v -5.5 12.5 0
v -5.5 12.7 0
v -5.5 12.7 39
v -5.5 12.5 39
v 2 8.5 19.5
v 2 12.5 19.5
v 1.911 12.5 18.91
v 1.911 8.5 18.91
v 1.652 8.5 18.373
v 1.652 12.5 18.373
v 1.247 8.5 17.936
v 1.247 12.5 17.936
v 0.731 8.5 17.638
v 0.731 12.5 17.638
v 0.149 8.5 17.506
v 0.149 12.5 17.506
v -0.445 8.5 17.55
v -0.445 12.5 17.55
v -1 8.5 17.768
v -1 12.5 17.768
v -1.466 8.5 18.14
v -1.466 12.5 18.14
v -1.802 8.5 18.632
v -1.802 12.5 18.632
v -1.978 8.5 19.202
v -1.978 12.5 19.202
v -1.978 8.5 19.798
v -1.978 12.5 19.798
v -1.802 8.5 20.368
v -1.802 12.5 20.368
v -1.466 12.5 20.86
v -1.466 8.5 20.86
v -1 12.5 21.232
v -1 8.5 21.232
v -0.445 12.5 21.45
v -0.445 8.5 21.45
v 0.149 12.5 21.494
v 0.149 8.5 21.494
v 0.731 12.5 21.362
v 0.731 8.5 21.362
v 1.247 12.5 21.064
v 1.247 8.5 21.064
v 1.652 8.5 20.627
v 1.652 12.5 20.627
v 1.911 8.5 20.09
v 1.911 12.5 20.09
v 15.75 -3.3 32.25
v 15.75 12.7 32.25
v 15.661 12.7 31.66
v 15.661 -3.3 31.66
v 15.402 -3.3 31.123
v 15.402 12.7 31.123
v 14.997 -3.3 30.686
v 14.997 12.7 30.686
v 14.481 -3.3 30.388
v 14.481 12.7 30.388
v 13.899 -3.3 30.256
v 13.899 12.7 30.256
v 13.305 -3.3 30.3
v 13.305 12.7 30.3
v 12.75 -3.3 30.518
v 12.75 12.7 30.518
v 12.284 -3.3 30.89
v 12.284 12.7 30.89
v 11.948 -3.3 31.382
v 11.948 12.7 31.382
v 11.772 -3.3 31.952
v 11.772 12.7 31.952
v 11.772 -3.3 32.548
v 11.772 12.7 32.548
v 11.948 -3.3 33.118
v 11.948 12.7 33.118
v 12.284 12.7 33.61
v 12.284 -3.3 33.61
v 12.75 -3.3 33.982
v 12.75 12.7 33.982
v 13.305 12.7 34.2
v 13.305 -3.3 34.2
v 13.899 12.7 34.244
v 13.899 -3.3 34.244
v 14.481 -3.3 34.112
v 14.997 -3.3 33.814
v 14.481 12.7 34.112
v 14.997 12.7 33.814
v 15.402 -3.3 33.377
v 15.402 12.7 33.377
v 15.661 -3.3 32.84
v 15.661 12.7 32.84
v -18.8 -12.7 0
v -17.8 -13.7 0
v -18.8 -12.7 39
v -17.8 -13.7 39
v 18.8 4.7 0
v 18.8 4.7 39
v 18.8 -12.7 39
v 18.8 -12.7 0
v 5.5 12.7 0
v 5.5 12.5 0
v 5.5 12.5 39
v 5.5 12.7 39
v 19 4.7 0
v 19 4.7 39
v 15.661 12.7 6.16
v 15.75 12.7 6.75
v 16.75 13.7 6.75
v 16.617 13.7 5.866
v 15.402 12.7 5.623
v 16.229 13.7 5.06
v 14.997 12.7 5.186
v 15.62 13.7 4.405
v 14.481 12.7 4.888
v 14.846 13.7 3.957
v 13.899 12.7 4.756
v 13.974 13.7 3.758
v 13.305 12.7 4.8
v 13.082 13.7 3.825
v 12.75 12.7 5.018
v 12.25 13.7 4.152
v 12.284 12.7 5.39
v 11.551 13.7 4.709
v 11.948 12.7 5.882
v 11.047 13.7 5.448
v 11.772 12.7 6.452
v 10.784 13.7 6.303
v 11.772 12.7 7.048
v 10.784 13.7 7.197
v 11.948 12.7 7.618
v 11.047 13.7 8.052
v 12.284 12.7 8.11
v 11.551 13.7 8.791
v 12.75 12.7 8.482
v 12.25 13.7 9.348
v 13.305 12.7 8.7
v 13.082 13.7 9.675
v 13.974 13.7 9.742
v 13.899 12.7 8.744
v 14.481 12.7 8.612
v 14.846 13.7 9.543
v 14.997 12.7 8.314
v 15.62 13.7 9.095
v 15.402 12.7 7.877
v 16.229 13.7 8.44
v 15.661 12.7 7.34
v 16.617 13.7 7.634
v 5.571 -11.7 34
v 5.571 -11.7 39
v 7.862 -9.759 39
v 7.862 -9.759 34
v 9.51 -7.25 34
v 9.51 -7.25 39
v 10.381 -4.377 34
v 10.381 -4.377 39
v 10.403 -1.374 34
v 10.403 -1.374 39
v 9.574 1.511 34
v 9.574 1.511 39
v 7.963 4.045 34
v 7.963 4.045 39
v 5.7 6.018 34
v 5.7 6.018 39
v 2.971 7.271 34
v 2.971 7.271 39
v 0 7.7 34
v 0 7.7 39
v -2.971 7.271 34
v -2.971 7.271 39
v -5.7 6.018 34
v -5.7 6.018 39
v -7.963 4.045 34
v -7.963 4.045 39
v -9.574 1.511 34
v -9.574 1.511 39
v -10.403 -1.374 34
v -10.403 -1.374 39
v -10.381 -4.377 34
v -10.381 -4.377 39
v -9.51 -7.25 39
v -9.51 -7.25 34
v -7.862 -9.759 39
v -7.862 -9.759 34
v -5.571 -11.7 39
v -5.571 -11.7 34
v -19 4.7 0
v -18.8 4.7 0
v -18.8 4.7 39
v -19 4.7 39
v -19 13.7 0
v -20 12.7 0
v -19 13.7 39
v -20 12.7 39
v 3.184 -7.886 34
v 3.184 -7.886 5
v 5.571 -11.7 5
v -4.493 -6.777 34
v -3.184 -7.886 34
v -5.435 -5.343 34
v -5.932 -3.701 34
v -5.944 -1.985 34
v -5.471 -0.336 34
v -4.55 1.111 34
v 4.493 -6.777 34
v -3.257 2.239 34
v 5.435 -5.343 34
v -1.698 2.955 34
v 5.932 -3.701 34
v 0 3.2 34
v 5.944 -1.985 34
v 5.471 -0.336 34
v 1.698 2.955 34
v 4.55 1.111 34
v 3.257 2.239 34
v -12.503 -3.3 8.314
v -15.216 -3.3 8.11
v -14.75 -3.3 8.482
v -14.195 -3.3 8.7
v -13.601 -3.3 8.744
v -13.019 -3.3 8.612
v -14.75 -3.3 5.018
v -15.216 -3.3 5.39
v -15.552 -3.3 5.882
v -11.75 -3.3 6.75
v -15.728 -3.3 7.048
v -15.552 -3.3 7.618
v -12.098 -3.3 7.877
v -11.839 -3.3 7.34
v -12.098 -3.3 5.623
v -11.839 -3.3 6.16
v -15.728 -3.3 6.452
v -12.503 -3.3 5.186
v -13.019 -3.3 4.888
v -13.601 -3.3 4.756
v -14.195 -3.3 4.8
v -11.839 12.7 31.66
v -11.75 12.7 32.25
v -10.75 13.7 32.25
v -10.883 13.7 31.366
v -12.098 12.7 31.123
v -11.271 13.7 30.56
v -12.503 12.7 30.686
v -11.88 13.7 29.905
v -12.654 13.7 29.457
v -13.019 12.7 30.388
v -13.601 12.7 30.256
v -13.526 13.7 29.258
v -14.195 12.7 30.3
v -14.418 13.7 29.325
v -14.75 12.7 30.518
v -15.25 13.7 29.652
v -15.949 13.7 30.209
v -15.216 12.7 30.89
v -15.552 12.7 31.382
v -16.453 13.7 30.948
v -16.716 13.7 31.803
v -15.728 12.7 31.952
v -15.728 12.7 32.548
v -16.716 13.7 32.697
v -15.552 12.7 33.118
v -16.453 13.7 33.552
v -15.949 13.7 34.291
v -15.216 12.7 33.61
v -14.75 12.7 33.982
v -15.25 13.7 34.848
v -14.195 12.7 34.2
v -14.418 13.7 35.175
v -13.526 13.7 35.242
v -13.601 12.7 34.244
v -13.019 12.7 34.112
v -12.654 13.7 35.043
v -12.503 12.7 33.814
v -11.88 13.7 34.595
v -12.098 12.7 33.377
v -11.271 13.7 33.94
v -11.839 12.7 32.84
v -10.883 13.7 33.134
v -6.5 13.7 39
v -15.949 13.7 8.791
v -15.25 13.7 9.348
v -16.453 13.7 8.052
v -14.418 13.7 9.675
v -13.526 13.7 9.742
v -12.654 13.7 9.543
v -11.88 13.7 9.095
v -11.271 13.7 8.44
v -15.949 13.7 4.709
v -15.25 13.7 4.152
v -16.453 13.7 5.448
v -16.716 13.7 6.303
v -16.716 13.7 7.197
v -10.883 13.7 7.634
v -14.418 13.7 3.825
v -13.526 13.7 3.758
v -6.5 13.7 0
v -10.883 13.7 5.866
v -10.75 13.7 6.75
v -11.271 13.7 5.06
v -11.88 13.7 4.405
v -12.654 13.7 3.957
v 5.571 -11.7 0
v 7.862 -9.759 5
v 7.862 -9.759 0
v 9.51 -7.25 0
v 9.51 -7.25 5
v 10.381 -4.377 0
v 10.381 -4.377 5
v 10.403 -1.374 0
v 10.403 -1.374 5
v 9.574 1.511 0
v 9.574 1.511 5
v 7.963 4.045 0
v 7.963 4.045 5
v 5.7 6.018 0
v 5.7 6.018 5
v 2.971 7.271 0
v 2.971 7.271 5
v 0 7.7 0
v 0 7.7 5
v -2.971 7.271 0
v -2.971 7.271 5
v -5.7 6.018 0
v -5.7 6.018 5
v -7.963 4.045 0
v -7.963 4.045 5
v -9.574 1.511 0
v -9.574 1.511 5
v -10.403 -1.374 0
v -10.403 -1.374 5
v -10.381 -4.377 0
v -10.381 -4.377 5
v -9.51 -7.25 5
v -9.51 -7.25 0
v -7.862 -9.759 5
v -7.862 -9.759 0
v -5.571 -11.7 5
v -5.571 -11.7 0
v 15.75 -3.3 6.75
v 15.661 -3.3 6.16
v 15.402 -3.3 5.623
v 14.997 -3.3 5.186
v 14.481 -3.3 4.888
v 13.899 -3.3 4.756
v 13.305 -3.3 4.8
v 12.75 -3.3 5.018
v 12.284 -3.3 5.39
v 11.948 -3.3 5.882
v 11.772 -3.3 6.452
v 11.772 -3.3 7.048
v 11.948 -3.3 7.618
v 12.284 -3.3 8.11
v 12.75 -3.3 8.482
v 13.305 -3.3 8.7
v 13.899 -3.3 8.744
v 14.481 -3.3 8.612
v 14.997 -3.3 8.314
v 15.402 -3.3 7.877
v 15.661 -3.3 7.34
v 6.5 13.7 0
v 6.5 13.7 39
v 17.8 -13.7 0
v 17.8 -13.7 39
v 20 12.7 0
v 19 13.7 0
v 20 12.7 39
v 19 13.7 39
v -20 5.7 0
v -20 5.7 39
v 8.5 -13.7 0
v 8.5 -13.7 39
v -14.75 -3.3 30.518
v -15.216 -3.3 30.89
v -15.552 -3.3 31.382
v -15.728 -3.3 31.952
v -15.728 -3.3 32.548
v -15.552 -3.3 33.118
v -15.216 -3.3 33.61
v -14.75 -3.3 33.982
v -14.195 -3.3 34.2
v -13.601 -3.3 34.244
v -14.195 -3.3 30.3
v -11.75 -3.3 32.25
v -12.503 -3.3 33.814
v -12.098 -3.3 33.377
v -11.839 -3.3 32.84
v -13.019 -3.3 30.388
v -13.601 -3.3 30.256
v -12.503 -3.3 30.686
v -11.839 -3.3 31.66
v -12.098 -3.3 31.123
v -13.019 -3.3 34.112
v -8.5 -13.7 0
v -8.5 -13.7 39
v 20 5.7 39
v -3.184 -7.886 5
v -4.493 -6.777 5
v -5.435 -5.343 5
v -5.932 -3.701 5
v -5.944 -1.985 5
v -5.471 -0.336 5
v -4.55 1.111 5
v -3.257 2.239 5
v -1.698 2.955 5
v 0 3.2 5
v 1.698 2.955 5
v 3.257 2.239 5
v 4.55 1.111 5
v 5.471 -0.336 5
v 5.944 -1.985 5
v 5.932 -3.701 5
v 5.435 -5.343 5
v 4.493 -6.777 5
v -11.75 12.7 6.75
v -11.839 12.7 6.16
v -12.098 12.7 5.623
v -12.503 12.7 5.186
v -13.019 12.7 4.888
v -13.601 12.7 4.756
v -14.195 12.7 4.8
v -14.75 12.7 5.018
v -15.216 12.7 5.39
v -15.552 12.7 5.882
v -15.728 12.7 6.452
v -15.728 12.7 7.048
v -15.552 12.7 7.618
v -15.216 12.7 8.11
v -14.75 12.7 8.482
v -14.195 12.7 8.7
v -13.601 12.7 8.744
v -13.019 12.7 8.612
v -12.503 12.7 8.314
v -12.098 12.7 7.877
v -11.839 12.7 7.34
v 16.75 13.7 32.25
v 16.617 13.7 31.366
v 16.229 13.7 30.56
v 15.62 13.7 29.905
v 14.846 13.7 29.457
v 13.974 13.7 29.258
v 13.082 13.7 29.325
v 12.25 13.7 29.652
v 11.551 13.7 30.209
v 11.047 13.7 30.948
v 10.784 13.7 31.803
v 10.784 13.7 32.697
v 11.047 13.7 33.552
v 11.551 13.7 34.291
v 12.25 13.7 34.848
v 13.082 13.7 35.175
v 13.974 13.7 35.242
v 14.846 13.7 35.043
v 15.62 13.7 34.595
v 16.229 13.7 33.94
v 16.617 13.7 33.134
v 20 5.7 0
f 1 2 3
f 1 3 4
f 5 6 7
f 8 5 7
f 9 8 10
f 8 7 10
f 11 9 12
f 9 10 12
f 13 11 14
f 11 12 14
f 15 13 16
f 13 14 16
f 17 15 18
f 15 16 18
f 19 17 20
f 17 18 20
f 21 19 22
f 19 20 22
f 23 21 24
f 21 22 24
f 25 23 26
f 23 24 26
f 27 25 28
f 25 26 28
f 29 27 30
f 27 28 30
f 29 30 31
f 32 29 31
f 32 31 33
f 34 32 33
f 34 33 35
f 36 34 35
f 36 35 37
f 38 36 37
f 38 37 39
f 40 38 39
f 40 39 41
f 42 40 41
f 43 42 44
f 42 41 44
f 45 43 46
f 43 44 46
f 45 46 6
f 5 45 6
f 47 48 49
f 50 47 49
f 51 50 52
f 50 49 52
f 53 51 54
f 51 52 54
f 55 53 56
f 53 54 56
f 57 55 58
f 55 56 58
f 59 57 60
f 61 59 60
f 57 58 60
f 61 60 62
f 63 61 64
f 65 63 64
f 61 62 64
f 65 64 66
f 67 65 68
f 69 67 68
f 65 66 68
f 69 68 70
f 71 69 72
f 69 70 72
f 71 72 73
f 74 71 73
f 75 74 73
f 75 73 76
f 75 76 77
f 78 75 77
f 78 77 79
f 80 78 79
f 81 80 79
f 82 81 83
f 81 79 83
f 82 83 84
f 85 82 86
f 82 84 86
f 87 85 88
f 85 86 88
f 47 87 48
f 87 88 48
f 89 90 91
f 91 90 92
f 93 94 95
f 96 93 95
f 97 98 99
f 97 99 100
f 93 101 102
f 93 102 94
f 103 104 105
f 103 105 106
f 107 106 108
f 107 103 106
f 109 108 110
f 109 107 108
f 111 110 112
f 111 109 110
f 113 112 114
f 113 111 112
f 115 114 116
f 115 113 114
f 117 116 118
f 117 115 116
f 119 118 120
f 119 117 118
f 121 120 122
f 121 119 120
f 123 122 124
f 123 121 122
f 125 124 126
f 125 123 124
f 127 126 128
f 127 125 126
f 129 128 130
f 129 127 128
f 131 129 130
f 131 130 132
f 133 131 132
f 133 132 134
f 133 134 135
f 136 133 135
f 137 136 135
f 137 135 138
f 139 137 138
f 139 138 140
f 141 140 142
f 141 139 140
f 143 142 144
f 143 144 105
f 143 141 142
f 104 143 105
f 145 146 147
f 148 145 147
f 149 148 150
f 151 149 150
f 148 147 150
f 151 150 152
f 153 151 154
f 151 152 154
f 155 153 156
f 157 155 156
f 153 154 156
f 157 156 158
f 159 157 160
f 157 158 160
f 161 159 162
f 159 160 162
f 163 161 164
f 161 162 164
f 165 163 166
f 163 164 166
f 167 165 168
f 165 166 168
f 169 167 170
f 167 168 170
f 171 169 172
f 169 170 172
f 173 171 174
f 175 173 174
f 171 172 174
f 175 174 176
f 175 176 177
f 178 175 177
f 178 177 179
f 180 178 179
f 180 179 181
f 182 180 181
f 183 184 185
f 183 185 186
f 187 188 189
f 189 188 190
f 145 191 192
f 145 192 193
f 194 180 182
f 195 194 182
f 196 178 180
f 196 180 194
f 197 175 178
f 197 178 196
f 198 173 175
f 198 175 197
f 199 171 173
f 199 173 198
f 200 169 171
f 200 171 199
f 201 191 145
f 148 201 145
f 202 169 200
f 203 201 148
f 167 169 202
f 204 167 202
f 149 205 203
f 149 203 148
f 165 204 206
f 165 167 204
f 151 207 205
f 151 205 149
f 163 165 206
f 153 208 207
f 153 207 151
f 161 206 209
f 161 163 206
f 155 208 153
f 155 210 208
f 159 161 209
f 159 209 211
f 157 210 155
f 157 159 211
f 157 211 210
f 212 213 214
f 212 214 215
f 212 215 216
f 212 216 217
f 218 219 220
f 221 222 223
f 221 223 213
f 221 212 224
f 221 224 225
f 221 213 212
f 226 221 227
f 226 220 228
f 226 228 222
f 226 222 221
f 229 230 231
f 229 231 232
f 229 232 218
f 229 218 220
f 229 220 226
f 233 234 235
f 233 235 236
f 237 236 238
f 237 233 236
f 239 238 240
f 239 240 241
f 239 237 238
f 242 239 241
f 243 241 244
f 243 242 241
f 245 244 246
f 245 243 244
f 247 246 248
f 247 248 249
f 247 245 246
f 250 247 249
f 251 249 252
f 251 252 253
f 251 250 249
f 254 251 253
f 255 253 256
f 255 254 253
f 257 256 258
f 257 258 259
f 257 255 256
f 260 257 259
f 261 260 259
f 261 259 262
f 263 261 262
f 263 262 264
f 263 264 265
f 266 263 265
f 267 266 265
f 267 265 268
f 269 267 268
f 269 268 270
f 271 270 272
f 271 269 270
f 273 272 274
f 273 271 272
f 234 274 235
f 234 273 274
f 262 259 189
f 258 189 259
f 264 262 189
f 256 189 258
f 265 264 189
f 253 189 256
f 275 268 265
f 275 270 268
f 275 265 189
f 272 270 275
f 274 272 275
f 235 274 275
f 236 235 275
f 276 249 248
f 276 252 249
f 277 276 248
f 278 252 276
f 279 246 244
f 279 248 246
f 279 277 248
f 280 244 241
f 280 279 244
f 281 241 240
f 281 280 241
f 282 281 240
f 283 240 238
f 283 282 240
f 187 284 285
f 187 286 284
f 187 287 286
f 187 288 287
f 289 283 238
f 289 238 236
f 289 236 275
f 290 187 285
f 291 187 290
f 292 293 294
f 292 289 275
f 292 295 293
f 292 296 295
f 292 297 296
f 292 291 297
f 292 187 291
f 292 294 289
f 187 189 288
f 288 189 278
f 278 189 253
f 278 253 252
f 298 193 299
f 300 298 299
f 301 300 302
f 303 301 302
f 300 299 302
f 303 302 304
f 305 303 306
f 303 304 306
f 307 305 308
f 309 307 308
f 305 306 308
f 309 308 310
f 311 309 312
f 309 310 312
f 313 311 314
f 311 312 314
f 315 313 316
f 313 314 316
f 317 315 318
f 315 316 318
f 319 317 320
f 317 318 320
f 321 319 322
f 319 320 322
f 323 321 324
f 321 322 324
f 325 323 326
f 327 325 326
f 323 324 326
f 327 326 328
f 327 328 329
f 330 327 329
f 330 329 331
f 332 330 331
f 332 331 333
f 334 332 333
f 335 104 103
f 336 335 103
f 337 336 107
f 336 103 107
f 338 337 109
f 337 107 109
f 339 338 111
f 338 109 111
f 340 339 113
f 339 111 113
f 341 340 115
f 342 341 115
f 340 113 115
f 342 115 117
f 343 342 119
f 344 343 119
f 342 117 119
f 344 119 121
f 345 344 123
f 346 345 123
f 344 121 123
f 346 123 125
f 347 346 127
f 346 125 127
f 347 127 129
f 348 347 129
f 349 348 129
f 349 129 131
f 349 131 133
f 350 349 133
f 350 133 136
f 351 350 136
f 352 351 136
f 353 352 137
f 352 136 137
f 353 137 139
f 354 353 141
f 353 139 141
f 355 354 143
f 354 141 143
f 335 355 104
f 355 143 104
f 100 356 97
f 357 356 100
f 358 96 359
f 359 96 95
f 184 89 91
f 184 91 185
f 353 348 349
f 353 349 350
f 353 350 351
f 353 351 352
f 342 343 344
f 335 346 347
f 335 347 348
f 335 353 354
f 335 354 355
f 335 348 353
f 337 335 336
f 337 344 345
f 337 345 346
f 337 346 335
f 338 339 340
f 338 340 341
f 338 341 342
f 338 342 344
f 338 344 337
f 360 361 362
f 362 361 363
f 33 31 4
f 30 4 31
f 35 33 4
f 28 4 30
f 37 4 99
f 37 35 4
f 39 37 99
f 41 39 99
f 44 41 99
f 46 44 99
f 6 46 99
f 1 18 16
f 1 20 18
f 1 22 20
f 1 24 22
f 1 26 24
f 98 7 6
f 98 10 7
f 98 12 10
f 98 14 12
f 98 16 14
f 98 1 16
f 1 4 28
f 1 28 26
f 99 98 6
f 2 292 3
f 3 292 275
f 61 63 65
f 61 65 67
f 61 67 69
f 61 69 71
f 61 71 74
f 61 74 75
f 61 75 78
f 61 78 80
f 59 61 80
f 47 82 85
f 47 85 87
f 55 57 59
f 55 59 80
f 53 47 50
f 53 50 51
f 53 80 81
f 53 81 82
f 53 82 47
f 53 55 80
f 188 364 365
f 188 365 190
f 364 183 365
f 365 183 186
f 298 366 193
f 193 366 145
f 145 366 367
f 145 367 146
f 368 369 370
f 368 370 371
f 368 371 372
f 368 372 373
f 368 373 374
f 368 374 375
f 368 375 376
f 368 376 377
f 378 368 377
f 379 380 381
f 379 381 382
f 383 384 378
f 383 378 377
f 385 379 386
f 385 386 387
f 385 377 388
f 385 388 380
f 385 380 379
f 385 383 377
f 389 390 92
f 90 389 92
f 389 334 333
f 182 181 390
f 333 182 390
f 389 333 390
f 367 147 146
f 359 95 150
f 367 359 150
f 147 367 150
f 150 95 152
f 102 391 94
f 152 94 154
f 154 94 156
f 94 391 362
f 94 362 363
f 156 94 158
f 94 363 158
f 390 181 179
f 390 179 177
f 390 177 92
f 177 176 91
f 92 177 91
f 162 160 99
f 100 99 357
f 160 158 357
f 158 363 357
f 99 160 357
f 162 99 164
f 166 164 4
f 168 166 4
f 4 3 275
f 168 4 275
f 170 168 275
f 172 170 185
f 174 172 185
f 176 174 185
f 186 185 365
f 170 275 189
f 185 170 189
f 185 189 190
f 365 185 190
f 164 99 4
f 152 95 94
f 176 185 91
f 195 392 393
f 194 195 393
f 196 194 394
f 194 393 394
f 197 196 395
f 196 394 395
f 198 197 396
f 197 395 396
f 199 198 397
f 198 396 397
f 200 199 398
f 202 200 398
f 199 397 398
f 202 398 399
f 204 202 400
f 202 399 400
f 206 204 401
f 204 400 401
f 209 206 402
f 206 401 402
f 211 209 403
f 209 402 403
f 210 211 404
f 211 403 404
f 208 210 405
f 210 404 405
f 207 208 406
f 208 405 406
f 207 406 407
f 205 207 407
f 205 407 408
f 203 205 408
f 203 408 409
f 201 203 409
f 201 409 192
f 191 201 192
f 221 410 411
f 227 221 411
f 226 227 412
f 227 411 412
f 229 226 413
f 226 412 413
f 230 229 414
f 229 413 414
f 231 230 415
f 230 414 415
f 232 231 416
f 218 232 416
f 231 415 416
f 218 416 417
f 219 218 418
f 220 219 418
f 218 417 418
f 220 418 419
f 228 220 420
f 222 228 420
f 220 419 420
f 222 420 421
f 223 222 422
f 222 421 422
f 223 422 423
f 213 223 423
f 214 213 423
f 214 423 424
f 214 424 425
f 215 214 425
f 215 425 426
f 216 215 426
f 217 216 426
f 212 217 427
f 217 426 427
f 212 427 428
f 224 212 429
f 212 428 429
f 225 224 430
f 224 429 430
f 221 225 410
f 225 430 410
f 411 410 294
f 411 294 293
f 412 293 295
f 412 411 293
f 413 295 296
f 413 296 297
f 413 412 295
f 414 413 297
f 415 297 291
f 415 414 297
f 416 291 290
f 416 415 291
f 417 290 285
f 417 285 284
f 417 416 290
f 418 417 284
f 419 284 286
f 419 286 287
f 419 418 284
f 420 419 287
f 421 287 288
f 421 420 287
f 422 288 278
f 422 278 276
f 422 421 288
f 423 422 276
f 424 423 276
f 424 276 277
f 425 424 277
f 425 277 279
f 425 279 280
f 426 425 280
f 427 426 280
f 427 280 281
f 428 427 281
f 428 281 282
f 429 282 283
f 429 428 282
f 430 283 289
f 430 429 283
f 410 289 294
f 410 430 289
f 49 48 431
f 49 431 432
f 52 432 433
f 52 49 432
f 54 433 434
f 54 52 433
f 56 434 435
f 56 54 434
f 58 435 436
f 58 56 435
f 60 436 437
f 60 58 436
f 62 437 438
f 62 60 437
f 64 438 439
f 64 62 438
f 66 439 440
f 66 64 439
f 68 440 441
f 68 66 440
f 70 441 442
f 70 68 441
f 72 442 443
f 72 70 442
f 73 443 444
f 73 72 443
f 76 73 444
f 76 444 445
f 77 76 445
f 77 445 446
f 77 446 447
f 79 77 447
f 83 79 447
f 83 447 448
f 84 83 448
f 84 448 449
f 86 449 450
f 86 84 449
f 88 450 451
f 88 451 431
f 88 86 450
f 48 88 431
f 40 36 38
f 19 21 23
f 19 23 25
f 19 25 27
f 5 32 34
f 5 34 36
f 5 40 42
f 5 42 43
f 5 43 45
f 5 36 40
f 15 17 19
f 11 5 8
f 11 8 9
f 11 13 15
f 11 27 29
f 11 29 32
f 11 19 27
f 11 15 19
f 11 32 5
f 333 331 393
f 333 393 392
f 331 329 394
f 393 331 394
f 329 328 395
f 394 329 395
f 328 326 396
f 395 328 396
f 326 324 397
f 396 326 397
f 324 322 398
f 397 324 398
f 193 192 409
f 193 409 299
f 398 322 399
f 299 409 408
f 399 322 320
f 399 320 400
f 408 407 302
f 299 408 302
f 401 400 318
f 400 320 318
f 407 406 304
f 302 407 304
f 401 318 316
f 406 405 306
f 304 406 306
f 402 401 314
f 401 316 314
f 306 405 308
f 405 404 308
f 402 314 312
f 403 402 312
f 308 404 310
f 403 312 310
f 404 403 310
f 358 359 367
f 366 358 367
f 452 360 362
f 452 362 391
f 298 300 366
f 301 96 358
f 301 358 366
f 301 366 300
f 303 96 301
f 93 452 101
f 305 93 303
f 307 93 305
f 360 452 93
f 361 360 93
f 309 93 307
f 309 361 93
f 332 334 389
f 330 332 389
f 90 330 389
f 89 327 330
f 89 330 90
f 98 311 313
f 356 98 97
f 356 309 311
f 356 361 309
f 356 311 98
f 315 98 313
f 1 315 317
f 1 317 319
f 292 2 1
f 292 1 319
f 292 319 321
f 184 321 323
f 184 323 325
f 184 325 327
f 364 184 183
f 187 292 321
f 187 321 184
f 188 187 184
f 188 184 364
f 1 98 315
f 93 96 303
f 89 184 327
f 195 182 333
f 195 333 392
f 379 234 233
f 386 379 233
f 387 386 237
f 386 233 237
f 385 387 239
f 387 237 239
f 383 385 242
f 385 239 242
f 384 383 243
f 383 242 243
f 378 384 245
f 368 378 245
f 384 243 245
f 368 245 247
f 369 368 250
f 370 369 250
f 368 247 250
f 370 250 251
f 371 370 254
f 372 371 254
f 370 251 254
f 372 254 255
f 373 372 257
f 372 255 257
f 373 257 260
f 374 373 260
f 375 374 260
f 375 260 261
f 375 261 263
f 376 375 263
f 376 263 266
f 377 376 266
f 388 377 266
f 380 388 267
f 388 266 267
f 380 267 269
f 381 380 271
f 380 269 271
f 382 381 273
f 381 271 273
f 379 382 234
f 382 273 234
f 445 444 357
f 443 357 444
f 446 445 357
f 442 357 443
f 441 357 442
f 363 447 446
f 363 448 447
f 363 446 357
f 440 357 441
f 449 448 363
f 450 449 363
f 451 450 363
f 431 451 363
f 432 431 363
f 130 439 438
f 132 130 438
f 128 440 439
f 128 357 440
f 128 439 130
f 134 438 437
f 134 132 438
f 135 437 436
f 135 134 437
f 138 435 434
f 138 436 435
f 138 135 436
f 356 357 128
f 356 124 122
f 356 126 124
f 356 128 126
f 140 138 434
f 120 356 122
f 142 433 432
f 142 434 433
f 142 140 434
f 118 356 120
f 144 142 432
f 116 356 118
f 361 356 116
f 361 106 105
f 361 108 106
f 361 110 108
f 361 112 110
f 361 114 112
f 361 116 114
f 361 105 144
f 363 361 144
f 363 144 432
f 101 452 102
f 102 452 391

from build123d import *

# Parameters (mm, degrees)
SALIENTE_EXTRUIR1_DEPTH = 39
CORTAR_EXTRUIR1_DEPTH   = 39
SALIENTE_EXTRUIR2_DEPTH = 29
CROQUIS5_R              = 2
CORTAR_EXTRUIR2_DEPTH   = 17
CROQUIS6_R              = 2
CORTAR_EXTRUIR3_DEPTH   = 4
CHAFL_N1_SIZE           = 1


with BuildPart() as part:
    # Croquis1 → Saliente-Extruir1 (new body)
    with BuildSketch(Plane.XY):
        Polygon((-5.5, 13.7), (-5.5, 12.5), (5.5, 12.5), (5.5, 13.7), (20, 13.7), (20, 4.7), (18.8, 4.7), (18.8, -13.7), (-18.8, -13.7), (-18.8, 4.7), (-20, 4.7), (-20, 13.7), align=None)
    extrude(amount=SALIENTE_EXTRUIR1_DEPTH)

    # Croquis2 → Cortar-Extruir1 (cut)
    with BuildSketch(Plane.XY.offset(39)):
        with BuildLine():
            Line((-5.571355311, -11.7), (-8.5, -13.7))
            Line((-8.5, -13.7), (8.5, -13.7))
            Line((8.5, -13.7), (5.571355311, -11.7))
            ThreePointArc((5.571355311, -11.7), (0, 7.7), (-5.571355311, -11.7))
        make_face()
    extrude(amount=-CORTAR_EXTRUIR1_DEPTH, mode=Mode.SUBTRACT)

    # Croquis3 → Saliente-Extruir2 (add)
    with BuildSketch(Plane(origin=(0, 0, 5), x_dir=(-1, 0, 0), z_dir=(0, 0, -1))):
        with BuildLine():
            Line((-3.183631606, -7.885714286), (-5.571355311, -11.7))
            ThreePointArc((-5.571355311, -11.7), (0, 7.7), (5.571355311, -11.7))
            Line((5.571355311, -11.7), (3.183631606, -7.885714286))
            ThreePointArc((3.183631606, -7.885714286), (0, 3.2), (-3.183631606, -7.885714286))
        make_face()
    extrude(amount=-SALIENTE_EXTRUIR2_DEPTH)

    # Croquis5 → Cortar-Extruir2 (cut)
    with BuildSketch(Plane(origin=(0, 13.7, 0), x_dir=(1, 0, 0), z_dir=(0, 1, 0))):
        with Locations((13.75, -32.25)):
            Circle(CROQUIS5_R)
        with Locations((-13.75, -32.25)):
            Circle(CROQUIS5_R)
        with Locations((13.75, -6.75)):
            Circle(CROQUIS5_R)
        with Locations((-13.75, -6.75)):
            Circle(CROQUIS5_R)
    extrude(amount=-CORTAR_EXTRUIR2_DEPTH, mode=Mode.SUBTRACT)

    # Croquis6 → Cortar-Extruir3 (cut)
    with BuildSketch(Plane(origin=(0, 12.5, 0), x_dir=(1, 0, 0), z_dir=(0, 1, 0))):
        with Locations((0, -19.5)):
            Circle(CROQUIS6_R)
    extrude(amount=-CORTAR_EXTRUIR3_DEPTH, mode=Mode.SUBTRACT)

    # Chaflán1
    chafl_n1_edges = [part.edges().sort_by_distance(p)[0] for p in [
        (20, 4.7, 19.5),
        (18.8, -13.7, 19.5),
        (-18.8, -13.7, 19.5),
        (-20, 4.7, 19.5),
        (-20, 13.7, 19.5),
        (-5.5, 13.7, 19.5),
        (5.5, 13.7, 19.5),
        (20, 13.7, 19.5),
        (11.75, 13.7, 32.25),
        (-15.75, 13.7, 32.25),
        (11.75, 13.7, 6.75),
        (-15.75, 13.7, 6.75),
    ]]
    chamfer(chafl_n1_edges, length=CHAFL_N1_SIZE)


solid = part.part
